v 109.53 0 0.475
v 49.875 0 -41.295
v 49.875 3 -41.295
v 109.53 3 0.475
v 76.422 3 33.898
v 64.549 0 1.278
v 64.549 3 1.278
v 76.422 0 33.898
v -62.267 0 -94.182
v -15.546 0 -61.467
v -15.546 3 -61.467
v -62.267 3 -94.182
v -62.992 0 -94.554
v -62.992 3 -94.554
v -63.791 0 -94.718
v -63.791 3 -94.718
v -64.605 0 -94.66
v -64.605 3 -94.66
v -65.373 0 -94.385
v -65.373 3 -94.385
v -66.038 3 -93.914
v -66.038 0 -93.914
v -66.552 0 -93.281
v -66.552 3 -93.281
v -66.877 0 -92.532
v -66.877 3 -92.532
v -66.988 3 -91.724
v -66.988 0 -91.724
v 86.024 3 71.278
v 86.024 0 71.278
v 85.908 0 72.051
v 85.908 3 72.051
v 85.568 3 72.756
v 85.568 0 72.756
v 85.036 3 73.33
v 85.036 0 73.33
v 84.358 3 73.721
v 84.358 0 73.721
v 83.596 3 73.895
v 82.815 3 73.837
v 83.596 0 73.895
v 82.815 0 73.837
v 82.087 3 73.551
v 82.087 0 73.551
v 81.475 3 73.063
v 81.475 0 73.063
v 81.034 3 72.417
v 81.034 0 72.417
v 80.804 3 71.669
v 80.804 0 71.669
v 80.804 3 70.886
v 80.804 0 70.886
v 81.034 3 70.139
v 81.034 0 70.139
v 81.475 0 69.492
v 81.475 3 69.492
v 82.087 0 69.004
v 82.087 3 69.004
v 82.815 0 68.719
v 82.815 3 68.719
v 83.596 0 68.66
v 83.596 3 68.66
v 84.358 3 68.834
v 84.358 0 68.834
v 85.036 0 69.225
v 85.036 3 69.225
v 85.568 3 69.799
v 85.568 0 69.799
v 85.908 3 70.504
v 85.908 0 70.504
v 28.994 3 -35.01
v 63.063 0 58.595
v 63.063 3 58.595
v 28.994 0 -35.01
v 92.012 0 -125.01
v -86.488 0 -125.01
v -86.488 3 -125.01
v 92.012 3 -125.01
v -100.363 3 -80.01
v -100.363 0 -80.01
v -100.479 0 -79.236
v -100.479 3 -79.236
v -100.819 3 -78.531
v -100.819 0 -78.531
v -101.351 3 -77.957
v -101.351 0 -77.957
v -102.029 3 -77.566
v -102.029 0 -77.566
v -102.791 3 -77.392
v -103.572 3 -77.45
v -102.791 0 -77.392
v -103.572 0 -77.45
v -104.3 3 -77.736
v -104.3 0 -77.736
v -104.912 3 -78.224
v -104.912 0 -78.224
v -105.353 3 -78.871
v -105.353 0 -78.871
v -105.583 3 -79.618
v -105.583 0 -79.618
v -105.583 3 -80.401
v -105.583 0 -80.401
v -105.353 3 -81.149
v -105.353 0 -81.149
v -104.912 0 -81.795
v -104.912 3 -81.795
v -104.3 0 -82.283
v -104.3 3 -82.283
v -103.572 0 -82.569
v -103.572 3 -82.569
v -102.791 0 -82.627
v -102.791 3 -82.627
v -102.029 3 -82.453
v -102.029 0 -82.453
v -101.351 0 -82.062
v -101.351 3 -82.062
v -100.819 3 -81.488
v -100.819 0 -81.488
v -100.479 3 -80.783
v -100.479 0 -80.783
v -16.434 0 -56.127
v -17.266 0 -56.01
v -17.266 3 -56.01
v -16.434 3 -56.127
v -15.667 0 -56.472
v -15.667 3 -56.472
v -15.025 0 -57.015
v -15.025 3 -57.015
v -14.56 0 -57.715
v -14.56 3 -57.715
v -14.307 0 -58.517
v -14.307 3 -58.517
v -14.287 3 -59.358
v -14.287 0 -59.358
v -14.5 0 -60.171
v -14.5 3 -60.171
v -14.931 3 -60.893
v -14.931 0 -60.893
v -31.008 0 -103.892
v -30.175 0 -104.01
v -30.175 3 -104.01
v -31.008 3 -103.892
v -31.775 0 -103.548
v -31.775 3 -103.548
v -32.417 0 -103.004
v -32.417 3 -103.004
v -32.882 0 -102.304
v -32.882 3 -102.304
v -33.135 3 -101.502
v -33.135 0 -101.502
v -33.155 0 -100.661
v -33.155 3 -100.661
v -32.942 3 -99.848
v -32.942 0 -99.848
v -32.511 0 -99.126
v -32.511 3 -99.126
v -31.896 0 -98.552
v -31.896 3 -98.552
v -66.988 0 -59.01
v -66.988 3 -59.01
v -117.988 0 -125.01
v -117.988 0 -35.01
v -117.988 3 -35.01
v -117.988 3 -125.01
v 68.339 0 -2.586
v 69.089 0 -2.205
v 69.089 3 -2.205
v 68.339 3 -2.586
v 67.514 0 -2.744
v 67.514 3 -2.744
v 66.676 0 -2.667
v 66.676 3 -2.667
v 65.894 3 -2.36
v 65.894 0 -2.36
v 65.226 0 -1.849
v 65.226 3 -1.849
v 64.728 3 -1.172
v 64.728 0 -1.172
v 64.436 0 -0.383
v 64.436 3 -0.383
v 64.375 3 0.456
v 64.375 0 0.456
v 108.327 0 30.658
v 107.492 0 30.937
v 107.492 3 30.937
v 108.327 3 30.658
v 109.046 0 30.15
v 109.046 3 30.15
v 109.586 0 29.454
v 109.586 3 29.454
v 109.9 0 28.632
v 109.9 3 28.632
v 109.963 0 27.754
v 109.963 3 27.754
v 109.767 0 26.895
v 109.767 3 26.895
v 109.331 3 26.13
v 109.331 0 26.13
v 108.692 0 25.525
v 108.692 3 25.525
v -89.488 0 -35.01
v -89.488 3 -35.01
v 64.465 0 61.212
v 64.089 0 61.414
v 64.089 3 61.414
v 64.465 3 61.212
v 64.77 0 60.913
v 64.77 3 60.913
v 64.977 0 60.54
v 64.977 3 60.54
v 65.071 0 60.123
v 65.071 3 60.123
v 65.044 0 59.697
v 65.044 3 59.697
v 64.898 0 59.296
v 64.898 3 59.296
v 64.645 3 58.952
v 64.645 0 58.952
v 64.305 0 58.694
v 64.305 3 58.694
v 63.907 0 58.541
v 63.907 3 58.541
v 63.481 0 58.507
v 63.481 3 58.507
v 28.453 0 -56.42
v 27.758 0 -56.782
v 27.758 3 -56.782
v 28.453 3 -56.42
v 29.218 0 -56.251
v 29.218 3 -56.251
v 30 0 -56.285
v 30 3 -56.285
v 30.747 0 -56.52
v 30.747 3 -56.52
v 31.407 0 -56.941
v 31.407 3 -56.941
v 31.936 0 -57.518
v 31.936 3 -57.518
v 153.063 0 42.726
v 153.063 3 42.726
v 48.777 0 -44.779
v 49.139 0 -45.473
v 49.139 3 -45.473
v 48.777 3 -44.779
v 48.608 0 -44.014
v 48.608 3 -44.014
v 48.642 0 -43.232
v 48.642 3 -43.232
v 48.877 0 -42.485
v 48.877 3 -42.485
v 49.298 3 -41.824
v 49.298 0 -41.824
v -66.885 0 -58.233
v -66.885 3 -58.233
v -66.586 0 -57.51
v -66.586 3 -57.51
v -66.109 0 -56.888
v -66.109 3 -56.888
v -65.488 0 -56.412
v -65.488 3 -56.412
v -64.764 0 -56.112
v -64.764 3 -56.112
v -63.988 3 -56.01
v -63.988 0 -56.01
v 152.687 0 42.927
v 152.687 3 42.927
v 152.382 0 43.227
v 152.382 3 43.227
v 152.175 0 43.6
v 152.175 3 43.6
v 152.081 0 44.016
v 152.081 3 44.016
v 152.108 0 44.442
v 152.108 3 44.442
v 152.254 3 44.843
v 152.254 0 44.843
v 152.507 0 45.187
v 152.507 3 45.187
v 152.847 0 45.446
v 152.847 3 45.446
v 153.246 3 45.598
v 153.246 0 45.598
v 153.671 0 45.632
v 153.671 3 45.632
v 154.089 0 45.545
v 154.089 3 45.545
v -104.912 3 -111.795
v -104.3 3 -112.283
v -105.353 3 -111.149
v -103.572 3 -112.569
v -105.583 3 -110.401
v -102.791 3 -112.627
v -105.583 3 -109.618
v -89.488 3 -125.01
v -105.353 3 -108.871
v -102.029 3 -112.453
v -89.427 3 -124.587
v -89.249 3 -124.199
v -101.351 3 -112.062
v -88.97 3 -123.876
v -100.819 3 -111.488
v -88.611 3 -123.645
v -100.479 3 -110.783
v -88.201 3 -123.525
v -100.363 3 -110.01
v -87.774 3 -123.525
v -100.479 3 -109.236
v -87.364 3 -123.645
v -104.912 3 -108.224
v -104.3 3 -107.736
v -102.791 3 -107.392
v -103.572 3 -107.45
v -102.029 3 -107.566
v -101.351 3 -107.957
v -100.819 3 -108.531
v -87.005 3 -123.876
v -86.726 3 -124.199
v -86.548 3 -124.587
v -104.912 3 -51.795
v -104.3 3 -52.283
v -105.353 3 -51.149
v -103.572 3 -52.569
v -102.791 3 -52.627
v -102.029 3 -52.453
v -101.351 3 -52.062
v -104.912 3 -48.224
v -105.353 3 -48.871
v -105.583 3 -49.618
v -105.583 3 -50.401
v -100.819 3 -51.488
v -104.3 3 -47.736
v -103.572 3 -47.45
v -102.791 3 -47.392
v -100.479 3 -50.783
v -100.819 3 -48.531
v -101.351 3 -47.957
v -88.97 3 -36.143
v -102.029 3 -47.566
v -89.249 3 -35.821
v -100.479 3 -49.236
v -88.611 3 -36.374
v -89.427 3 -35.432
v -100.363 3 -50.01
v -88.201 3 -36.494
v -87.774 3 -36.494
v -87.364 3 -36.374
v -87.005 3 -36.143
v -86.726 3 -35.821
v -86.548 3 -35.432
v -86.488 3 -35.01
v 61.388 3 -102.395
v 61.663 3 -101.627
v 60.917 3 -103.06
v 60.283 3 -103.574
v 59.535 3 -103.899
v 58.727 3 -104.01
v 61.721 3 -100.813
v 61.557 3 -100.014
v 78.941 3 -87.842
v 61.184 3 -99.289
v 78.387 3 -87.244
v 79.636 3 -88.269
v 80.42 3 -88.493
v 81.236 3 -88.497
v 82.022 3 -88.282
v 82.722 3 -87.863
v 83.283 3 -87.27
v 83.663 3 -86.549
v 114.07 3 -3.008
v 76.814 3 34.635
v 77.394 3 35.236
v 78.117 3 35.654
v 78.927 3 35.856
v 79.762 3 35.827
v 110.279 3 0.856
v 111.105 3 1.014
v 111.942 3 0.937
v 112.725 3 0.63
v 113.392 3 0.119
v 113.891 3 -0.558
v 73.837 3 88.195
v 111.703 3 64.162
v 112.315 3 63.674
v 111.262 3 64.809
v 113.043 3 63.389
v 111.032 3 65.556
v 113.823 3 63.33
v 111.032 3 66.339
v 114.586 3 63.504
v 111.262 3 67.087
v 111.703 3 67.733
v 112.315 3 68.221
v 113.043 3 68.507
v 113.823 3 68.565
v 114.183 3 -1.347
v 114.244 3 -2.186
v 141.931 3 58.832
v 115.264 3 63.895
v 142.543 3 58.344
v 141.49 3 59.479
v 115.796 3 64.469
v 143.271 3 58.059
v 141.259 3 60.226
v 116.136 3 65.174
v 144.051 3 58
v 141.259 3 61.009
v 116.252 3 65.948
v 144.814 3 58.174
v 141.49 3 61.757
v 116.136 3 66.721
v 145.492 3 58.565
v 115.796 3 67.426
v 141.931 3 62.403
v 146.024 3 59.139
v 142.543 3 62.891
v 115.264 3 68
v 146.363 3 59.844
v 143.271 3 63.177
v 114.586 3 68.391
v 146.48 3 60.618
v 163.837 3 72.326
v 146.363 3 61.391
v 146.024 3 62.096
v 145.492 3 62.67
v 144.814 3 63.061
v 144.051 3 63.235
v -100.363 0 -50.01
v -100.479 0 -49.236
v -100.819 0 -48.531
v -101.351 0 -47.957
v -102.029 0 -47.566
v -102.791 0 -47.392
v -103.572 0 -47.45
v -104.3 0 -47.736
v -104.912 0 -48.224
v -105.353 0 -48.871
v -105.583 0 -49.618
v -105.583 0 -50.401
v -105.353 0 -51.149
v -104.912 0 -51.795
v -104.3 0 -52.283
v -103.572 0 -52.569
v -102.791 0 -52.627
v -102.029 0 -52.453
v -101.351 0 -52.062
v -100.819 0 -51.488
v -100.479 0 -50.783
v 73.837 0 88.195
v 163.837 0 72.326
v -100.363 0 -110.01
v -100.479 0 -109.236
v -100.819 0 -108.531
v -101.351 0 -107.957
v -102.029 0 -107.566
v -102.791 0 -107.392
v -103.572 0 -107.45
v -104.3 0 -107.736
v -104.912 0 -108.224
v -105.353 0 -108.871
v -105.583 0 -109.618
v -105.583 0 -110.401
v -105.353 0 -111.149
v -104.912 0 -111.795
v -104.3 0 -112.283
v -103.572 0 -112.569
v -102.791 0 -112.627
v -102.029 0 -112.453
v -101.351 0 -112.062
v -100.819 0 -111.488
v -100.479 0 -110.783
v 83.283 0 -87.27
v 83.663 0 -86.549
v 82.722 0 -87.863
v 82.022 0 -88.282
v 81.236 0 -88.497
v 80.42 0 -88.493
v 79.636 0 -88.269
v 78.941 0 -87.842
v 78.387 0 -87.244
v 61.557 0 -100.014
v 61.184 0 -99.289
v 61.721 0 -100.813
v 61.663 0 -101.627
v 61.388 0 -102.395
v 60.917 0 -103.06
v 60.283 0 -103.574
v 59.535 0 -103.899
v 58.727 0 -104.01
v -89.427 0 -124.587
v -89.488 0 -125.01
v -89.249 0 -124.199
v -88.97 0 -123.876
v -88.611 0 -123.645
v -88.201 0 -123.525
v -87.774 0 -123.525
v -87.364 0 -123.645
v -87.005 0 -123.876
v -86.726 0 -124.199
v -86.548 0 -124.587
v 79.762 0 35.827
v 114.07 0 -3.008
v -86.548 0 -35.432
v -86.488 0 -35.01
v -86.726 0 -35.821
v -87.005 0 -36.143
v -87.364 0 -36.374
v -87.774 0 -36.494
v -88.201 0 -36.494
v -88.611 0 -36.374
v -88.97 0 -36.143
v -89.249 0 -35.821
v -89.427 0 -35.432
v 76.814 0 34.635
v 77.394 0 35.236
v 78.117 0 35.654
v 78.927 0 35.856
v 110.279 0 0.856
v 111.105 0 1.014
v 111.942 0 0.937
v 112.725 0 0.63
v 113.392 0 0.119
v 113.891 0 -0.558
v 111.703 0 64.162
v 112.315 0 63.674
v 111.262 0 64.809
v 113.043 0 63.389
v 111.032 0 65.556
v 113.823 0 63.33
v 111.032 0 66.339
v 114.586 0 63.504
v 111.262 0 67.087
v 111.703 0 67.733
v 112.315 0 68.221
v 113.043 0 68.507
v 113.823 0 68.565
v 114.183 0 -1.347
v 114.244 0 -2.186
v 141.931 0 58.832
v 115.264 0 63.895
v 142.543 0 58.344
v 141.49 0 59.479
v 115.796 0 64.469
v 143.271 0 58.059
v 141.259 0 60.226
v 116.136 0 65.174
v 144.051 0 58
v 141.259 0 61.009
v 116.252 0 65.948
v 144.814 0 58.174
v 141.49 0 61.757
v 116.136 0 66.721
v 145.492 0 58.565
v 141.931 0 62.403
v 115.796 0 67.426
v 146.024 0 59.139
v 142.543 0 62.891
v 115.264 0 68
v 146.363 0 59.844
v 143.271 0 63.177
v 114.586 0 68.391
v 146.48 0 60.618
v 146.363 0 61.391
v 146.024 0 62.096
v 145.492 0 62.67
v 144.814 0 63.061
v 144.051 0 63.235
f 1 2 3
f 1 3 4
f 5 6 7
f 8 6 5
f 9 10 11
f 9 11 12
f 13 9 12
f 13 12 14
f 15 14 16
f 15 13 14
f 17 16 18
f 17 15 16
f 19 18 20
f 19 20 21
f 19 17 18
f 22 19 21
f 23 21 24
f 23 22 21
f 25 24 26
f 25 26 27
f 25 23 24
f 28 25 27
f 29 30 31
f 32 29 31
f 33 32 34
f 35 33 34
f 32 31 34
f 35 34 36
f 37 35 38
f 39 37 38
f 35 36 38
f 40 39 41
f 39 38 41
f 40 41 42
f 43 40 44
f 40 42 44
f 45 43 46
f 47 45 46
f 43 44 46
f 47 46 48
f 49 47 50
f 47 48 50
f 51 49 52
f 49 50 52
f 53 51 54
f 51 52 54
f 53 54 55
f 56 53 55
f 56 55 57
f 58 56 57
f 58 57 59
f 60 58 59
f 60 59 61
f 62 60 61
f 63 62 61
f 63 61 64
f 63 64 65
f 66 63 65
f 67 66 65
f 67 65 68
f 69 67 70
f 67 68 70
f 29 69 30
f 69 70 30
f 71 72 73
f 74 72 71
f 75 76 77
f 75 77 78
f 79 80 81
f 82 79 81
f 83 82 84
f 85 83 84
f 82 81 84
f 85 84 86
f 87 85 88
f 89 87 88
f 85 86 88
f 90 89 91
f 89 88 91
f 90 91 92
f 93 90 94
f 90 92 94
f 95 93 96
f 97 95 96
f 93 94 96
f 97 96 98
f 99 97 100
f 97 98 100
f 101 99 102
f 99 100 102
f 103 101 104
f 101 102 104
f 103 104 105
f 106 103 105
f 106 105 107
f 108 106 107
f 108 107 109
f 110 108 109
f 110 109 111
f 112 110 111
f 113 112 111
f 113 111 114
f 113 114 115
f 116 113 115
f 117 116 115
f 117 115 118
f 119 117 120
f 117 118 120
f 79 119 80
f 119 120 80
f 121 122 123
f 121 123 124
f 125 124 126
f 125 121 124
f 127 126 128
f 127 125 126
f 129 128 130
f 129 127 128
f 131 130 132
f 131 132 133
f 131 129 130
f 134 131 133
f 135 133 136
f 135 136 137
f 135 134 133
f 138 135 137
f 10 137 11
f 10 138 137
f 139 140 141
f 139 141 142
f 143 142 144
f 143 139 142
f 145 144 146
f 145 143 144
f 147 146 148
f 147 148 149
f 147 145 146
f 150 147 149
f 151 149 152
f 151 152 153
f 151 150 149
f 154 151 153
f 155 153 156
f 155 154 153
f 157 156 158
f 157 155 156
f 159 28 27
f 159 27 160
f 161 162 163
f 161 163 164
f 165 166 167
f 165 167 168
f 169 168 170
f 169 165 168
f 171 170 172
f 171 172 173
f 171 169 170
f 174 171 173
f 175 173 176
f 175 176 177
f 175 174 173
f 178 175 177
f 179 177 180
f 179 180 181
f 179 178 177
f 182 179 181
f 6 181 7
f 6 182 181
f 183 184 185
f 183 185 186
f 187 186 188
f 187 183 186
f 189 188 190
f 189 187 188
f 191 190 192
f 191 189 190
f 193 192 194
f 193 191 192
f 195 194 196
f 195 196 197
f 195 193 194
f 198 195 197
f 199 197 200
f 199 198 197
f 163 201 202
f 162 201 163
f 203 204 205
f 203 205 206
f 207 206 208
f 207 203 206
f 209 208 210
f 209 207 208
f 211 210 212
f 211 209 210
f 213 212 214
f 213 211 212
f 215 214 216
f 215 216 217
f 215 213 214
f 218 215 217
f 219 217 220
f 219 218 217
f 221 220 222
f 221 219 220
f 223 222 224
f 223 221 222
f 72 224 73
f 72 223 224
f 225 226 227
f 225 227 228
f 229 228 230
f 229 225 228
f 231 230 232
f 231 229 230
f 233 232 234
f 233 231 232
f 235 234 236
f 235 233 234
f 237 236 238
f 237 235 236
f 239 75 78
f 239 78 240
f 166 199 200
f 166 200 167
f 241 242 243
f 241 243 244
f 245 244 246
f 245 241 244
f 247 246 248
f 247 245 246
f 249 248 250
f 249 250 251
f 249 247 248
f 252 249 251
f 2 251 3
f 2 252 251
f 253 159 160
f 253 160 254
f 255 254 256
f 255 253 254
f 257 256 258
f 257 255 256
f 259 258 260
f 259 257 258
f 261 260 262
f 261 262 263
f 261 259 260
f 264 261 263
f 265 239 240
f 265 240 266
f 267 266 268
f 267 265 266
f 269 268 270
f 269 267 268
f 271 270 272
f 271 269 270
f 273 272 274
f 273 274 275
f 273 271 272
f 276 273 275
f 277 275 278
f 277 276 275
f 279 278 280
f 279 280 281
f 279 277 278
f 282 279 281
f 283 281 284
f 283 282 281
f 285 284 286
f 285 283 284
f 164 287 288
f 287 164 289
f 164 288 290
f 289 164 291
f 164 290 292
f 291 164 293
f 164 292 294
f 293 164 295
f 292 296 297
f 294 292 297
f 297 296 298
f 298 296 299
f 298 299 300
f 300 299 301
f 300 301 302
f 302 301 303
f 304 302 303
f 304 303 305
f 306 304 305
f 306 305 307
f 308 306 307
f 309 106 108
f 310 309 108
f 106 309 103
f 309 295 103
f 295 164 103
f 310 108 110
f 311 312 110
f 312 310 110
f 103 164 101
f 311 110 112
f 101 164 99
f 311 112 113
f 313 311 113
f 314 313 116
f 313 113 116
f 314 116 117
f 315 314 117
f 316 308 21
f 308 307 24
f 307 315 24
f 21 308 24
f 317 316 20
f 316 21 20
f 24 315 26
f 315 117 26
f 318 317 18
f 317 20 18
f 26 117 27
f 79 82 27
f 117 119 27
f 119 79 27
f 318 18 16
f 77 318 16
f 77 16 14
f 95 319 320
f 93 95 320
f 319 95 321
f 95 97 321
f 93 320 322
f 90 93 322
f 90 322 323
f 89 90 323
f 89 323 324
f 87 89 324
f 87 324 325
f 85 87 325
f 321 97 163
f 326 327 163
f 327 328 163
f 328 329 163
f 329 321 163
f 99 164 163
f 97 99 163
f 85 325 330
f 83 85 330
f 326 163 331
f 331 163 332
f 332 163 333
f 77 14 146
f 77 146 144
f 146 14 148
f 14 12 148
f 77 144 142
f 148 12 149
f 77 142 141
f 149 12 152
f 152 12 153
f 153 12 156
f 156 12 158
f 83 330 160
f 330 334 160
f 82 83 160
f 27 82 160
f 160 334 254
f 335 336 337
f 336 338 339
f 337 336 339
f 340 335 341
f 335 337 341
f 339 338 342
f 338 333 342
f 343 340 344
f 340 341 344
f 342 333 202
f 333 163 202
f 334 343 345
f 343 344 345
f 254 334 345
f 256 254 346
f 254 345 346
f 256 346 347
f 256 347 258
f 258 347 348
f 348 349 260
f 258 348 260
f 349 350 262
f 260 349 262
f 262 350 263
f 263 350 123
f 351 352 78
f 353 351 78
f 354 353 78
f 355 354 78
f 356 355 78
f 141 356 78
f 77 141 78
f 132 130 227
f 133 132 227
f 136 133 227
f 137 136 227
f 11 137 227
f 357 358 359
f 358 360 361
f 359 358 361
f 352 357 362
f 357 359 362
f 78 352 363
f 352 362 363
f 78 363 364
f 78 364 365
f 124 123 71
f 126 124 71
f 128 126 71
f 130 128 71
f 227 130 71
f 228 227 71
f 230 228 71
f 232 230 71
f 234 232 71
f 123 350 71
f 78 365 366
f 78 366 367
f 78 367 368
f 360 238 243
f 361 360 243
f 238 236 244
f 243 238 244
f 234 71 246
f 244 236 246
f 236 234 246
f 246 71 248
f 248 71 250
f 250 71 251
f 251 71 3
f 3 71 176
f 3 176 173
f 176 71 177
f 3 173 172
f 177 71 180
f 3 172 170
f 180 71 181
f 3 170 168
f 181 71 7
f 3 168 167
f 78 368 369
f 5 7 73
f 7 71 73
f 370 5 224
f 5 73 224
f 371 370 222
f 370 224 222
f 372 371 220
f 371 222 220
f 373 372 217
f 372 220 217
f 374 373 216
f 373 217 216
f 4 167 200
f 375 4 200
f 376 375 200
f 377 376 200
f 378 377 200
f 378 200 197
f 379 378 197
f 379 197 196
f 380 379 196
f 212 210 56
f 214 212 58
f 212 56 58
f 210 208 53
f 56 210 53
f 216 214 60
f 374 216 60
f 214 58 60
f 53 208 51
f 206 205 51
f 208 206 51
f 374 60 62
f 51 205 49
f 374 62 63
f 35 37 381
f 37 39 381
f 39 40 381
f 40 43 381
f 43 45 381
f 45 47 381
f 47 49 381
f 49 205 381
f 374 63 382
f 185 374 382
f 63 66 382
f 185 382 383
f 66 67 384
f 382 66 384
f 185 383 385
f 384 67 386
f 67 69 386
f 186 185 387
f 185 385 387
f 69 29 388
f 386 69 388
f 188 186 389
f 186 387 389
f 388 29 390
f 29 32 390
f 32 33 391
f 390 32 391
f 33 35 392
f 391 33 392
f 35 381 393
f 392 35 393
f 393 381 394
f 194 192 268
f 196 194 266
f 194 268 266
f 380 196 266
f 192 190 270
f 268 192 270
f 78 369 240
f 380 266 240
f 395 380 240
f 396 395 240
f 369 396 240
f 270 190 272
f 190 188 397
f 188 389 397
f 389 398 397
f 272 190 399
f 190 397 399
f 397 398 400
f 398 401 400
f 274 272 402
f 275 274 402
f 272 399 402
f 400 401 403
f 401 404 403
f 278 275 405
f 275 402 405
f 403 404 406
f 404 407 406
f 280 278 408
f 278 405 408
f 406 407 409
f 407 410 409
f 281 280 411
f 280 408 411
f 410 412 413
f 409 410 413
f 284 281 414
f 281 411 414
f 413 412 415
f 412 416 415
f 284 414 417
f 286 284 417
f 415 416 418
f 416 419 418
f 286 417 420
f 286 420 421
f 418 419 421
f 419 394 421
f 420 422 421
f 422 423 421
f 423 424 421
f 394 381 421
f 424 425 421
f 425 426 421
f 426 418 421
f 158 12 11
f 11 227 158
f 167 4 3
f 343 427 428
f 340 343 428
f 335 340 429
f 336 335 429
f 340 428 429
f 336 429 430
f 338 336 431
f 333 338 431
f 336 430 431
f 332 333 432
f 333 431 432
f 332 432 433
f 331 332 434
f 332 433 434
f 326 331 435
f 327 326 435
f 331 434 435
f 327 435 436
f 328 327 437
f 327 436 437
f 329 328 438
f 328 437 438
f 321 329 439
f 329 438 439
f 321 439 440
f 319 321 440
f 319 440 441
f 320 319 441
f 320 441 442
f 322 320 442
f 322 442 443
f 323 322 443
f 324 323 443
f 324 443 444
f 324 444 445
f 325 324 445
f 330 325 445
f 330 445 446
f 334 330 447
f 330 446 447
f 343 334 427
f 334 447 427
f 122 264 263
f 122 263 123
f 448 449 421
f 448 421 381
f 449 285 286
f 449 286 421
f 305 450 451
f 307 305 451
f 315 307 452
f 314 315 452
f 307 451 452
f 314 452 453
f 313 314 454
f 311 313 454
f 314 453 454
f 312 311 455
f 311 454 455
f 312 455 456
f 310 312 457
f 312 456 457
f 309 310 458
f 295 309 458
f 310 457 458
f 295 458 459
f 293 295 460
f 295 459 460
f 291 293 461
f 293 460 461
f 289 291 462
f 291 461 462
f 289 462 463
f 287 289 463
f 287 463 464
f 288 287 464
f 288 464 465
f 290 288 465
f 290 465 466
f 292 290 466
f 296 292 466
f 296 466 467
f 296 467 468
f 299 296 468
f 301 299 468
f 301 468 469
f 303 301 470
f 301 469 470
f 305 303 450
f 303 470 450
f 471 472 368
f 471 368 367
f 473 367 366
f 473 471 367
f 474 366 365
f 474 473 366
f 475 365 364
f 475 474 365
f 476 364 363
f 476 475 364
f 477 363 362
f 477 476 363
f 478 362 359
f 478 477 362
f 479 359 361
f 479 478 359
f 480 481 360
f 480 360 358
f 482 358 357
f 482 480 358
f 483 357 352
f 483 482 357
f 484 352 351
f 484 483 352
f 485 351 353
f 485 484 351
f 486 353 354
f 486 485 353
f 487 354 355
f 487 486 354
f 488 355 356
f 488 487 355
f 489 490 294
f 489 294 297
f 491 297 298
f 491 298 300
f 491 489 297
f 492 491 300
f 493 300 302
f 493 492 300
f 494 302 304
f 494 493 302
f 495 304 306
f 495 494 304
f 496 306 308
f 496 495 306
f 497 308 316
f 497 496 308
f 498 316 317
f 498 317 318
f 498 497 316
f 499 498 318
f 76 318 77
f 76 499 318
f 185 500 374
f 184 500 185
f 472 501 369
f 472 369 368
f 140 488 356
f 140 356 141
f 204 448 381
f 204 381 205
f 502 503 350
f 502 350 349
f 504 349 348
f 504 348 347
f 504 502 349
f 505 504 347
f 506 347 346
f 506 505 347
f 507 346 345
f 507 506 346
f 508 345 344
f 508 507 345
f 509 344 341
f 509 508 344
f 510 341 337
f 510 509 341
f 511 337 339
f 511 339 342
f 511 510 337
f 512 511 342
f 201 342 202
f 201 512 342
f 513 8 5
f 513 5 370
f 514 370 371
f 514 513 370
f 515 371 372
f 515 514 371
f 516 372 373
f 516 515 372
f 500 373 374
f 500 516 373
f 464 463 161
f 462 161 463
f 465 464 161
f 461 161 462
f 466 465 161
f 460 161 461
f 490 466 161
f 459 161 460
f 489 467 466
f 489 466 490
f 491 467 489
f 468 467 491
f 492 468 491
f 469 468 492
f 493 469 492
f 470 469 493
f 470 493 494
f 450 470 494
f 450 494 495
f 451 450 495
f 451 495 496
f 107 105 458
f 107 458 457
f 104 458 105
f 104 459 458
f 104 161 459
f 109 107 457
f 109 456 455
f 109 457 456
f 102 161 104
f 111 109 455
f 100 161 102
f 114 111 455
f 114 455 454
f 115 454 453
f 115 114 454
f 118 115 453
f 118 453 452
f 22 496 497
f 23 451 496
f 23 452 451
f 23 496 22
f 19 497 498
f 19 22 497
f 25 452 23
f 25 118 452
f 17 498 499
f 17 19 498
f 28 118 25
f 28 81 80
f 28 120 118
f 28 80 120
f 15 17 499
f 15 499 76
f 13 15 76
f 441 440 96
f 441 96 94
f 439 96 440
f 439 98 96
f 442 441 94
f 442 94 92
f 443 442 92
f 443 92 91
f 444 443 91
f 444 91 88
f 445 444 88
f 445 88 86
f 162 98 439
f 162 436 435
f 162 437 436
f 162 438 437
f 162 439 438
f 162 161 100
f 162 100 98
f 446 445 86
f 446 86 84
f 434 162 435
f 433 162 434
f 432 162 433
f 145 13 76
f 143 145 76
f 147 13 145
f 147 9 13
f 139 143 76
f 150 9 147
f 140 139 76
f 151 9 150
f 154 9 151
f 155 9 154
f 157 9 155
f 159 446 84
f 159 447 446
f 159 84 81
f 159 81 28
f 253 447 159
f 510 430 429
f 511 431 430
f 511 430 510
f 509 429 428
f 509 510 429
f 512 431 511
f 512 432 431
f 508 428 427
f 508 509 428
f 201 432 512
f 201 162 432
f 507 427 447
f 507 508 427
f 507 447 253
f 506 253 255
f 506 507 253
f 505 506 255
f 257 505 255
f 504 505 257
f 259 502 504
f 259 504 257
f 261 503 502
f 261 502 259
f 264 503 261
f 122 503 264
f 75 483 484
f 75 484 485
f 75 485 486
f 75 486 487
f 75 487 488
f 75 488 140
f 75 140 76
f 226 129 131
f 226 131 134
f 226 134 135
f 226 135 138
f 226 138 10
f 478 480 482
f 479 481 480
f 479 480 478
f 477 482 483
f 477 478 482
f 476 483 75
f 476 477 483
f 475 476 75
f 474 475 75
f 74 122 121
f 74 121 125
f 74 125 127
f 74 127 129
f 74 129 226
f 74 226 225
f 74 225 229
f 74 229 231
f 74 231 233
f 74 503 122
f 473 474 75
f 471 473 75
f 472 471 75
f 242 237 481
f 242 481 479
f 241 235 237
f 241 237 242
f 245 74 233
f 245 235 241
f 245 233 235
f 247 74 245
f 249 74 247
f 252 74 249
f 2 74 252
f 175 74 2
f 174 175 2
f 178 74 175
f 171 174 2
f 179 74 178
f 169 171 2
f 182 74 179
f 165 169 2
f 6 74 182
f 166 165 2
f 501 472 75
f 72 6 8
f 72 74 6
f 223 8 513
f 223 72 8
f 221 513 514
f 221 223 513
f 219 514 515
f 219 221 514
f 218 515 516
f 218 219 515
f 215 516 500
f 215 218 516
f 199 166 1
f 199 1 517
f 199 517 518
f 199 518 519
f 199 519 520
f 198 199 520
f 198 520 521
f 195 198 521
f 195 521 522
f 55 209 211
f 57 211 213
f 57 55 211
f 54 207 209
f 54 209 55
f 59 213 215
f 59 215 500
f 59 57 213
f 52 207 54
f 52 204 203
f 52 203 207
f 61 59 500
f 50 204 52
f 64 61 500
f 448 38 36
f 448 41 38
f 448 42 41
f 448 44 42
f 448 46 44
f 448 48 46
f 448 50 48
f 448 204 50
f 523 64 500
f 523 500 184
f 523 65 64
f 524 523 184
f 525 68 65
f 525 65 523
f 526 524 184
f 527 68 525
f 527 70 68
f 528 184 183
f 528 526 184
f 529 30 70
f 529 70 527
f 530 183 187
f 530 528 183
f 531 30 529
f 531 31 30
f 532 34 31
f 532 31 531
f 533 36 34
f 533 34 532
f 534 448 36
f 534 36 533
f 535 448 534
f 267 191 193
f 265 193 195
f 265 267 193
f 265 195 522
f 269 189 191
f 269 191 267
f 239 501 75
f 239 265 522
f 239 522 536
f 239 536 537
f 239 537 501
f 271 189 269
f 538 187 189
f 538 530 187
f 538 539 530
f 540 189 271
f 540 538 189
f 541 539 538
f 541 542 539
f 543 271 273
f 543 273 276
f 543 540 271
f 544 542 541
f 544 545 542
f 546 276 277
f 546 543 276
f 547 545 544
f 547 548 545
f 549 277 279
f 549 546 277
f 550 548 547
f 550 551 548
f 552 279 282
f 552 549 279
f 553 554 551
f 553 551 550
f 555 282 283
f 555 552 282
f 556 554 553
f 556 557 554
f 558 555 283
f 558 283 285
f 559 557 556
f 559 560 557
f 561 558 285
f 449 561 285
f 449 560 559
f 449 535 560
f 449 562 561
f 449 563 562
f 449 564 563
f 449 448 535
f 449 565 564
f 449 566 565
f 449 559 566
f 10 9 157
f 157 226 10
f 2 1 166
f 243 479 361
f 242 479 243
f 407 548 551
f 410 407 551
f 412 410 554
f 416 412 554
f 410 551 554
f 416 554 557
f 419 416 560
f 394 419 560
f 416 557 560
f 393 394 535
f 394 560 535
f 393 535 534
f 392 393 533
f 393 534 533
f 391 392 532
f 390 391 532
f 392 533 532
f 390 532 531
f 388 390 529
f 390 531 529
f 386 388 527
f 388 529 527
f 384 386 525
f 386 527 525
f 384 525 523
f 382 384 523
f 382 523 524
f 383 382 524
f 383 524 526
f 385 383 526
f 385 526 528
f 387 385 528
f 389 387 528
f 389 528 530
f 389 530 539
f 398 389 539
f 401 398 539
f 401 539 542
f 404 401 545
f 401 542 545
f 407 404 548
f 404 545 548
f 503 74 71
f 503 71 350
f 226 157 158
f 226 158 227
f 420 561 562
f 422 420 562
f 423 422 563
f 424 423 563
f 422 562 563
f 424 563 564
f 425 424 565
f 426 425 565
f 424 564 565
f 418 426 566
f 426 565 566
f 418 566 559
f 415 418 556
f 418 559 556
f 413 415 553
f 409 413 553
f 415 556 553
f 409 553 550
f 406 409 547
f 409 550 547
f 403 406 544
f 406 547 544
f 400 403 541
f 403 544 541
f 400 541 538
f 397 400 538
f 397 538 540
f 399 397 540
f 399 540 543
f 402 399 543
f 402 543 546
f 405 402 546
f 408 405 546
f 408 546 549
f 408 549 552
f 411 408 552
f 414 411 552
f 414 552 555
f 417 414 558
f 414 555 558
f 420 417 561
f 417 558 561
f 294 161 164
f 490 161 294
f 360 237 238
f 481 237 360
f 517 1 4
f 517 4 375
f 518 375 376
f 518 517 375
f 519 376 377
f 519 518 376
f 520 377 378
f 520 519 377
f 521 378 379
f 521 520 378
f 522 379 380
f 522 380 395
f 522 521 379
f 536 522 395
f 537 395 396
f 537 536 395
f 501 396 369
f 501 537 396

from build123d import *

# Parameters (mm, degrees)
F0_R     = 0.875
F1_DEPTH = 1
F2_SCALE = 3


with BuildPart() as f1:
    # F0 (on Front) → F1 (new body)
    with BuildSketch(Plane.XZ):
        with BuildLine():
            Line((-9.5, -65.0096278997), (50, -65.0096278997))
            Line((50, -65.0096278997), (70.3501985279, -9.0979169629))
            ThreePointArc((70.3501985279, -9.0979169629), (70.0513622891, -8.4570605809), (70.6922186712, -8.1582243421))
            Line((70.6922186712, -8.1582243421), (73.9414100328, 0.7688555553))
            Line((73.9414100328, 0.7688555553), (43.9414100328, 6.0586649766))
            Line((43.9414100328, 6.0586649766), (40.6922186712, -2.8684149209))
            ThreePointArc((40.6922186712, -2.8684149209), (40.9910549099, -3.5092713029), (40.3501985279, -3.8081075417))
            Line((40.3501985279, -3.8081075417), (28.9937738537, -35.0096278997))
            Line((28.9937738537, -35.0096278997), (-9.5, -35.0096278997))
            ThreePointArc((-9.5, -35.0096278997), (-10, -35.5096278997), (-10.5, -35.0096278997))
            Line((-10.5, -35.0096278997), (-20, -35.0096278997))
            Line((-20, -35.0096278997), (-20, -65.0096278997))
            Line((-20, -65.0096278997), (-10.5, -65.0096278997))
            ThreePointArc((-10.5, -65.0096278997), (-10, -64.5096278997), (-9.5, -65.0096278997))
        make_face()
        with Locations((-15, -60.0096278997)):
            Circle(F0_R, mode=Mode.SUBTRACT)
        with Locations((-15, -50.0096278997)):
            Circle(F0_R, mode=Mode.SUBTRACT)
        with BuildLine():
            ThreePointArc((-1.4264235636, -54.7336339889), (-2.4617486132, -54.8014927777), (-3, -53.9144819446))
            Line((-3, -53.9144819446), (-3, -43.0096278997))
            ThreePointArc((-3, -43.0096278997), (-2.7071067812, -42.3025211185), (-2, -42.0096278997))
            Line((-2, -42.0096278997), (13.573745568, -42.0096278997))
            ThreePointArc((13.573745568, -42.0096278997), (14.5274625188, -42.7089221002), (14.1473220044, -43.828779944))
            Line((14.1473220044, -43.828779944), (-1.4264235636, -54.7336339889))
        make_face(mode=Mode.SUBTRACT)
        with BuildLine():
            ThreePointArc((39.7240060892, -56.4360514633), (39.7918648781, -57.4713765129), (38.9048540449, -58.0096278997))
            Line((38.9048540449, -58.0096278997), (9.2706946342, -58.0096278997))
            ThreePointArc((9.2706946342, -58.0096278997), (8.3169776835, -57.3103336992), (8.6971181979, -56.1904758554))
            Line((8.6971181979, -56.1904758554), (28.5819376277, -42.2669753947))
            ThreePointArc((28.5819376277, -42.2669753947), (29.3291622417, -42.101319686), (29.9746661083, -42.5125510026))
            Line((29.9746661083, -42.5125510026), (39.7240060892, -56.4360514633))
        make_face(mode=Mode.SUBTRACT)
        with Locations((-15, -40.0096278997)):
            Circle(F0_R, mode=Mode.SUBTRACT)
        with BuildLine():
            Line((57.3523945133, -24.3424591944), (47.2169150643, -52.1894601158))
            ThreePointArc((47.2169150643, -52.1894601158), (46.4077486357, -52.8388848339), (45.4580703992, -52.4210164089))
            Line((45.4580703992, -52.4210164089), (35.7087304184, -38.4975159482))
            ThreePointArc((35.7087304184, -38.4975159482), (35.5430747096, -37.7502913341), (35.9543060263, -37.1047874675))
            Line((35.9543060263, -37.1047874675), (55.8391254561, -23.1812870068))
            ThreePointArc((55.8391254561, -23.1812870068), (57.0214633215, -23.2070857108), (57.3523945133, -24.3424591944))
        make_face(mode=Mode.SUBTRACT)
        with BuildLine():
            ThreePointArc((42.3588515407, -24.0748542982), (41.1765136753, -24.0490555942), (40.8455824836, -22.9136821106))
            Line((40.8455824836, -22.9136821106), (44.8031451361, -12.0403680867))
            ThreePointArc((44.8031451361, -12.0403680867), (45.2428377569, -11.5163628263), (45.9164859345, -11.397580477))
            Line((45.9164859345, -11.397580477), (55.1599311689, -13.0274492665))
            ThreePointArc((55.1599311689, -13.0274492665), (55.9625789983, -13.7958174056), (55.5598594276, -14.8314090638))
            Line((55.5598594276, -14.8314090638), (42.3588515407, -24.0748542982))
        make_face(mode=Mode.SUBTRACT)
        with Locations((47.1289670212, 0.4194796176)):
            Circle(F0_R, mode=Mode.SUBTRACT)
        with Locations((67.2808894911, -3.133848027)):
            Circle(F0_R, mode=Mode.SUBTRACT)
        with Locations((57.2049282561, -1.3571842047)):
            Circle(F0_R, mode=Mode.SUBTRACT)
    extrude(amount=-F1_DEPTH)


with BuildPart() as f1_1:
    # F2: moved
    add(f1.part.scale(F2_SCALE).moved(Location((-57.9875477074, 0, 70.0192557993))))


solid = f1_1.part
